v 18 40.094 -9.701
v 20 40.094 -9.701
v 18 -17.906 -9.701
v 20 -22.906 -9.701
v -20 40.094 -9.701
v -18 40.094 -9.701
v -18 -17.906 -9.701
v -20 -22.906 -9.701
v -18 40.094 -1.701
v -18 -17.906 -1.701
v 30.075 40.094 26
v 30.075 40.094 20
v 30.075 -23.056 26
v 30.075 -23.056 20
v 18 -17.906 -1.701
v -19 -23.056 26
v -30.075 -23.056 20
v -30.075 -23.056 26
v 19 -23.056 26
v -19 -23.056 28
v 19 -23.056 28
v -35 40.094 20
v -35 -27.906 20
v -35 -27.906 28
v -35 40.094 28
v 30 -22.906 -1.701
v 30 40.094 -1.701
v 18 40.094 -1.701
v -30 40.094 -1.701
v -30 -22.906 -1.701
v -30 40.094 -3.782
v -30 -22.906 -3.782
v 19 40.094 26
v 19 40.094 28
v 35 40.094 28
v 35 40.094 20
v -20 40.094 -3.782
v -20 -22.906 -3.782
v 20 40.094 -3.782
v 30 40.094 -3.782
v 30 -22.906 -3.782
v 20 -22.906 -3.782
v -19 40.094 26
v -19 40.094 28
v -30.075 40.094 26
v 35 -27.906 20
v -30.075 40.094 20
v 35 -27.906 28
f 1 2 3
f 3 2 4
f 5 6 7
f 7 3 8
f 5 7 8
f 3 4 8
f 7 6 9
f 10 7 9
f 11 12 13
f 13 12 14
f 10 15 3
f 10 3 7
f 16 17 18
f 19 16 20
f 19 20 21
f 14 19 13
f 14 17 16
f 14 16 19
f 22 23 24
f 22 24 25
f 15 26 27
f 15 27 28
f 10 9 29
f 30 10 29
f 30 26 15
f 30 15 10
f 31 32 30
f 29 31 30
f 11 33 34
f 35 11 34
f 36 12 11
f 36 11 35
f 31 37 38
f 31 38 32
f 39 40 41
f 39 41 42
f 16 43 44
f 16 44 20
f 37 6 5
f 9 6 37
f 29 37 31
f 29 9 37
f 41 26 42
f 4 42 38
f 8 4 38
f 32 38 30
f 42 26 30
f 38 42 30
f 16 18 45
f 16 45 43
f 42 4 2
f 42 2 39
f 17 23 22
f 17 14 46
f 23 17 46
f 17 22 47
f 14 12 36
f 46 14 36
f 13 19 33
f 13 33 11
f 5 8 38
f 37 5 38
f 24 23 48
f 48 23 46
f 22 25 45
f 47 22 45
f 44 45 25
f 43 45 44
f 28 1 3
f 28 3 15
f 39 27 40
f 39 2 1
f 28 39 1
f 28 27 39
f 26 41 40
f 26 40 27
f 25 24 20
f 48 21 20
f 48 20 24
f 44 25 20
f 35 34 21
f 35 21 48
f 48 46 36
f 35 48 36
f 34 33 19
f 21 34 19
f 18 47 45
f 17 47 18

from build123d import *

# Parameters (mm, degrees)
SKETCH_W        = 60
SKETCH_H        = 8
PAD_DEPTH       = 63
SKETCH001_W     = 36
SKETCH001_H     = 8
POCKET_DEPTH    = 58
COPYSKETCH002_W = 10
COPYSKETCH002_H = 7
POCKET001_DEPTH = 63
SKETCH002_W     = 70
SKETCH002_H     = 68
PAD001_DEPTH    = 8
SKETCH003_W     = 60.15
SKETCH003_H     = 63.15
POCKET002_DEPTH = 6
SKETCH004_W     = 38
SKETCH004_H     = 63.15
POCKET003_DEPTH = 2.001


with BuildPart() as below:
    # Sketch → Pad (new body)
    with BuildSketch(Plane(origin=(0, -22.90579, -6.167026), x_dir=(-1, 0, 0), z_dir=(0, 1, 0))):
        with Locations((0, 0.46571)):
            Rectangle(SKETCH_W, SKETCH_H)
    extrude(amount=PAD_DEPTH)

    # Sketch001 (on Face6 of Pad) → Pocket (cut)
    with BuildSketch(Plane(origin=(0, 40.09421, -6.167026), x_dir=(-1, 0, 0), z_dir=(0, 1, 0))):
        with Locations((0, 0.46571)):
            Rectangle(SKETCH001_W, SKETCH001_H)
    extrude(amount=-POCKET_DEPTH, mode=Mode.SUBTRACT)

    # CopySketch002 → Pocket001 (cut)
    with BuildSketch(Plane(origin=(0, 40.09421, -6.167026), x_dir=(-1, 0, 0), z_dir=(0, 1, 0))):
        with Locations((-25, -1.11507)):
            Rectangle(COPYSKETCH002_W, COPYSKETCH002_H)
        with Locations((25, -1.11507)):
            Rectangle(COPYSKETCH002_W, COPYSKETCH002_H)
    extrude(amount=-POCKET001_DEPTH, mode=Mode.SUBTRACT)


with BuildPart() as cover:
    # Sketch002 → Pad001 (new body)
    with BuildSketch(Plane.XY.offset(20)):
        with Locations((0, 6.094217)):
            Rectangle(SKETCH002_W, SKETCH002_H)
    extrude(amount=PAD001_DEPTH)

    # Sketch003 (on Face5 of Pad001) → Pocket002 (cut)
    with BuildSketch(Plane(origin=(0, 0, 20), x_dir=(1, 0, 0), z_dir=(0, 0, -1))):
        with Locations((0, -8.519217)):
            Rectangle(SKETCH003_W, SKETCH003_H)
    extrude(amount=-POCKET002_DEPTH, mode=Mode.SUBTRACT)

    # Sketch004 (on Face4 of Pocket002) → Pocket003 (cut, through all)
    with BuildSketch(Plane(origin=(0, 0, 26), x_dir=(1, 0, 0), z_dir=(0, 0, -1))):
        with Locations((0, -8.519217)):
            Rectangle(SKETCH004_W, SKETCH004_H)
    extrude(amount=-POCKET003_DEPTH, mode=Mode.SUBTRACT)


solid = Compound([below.part, cover.part])
